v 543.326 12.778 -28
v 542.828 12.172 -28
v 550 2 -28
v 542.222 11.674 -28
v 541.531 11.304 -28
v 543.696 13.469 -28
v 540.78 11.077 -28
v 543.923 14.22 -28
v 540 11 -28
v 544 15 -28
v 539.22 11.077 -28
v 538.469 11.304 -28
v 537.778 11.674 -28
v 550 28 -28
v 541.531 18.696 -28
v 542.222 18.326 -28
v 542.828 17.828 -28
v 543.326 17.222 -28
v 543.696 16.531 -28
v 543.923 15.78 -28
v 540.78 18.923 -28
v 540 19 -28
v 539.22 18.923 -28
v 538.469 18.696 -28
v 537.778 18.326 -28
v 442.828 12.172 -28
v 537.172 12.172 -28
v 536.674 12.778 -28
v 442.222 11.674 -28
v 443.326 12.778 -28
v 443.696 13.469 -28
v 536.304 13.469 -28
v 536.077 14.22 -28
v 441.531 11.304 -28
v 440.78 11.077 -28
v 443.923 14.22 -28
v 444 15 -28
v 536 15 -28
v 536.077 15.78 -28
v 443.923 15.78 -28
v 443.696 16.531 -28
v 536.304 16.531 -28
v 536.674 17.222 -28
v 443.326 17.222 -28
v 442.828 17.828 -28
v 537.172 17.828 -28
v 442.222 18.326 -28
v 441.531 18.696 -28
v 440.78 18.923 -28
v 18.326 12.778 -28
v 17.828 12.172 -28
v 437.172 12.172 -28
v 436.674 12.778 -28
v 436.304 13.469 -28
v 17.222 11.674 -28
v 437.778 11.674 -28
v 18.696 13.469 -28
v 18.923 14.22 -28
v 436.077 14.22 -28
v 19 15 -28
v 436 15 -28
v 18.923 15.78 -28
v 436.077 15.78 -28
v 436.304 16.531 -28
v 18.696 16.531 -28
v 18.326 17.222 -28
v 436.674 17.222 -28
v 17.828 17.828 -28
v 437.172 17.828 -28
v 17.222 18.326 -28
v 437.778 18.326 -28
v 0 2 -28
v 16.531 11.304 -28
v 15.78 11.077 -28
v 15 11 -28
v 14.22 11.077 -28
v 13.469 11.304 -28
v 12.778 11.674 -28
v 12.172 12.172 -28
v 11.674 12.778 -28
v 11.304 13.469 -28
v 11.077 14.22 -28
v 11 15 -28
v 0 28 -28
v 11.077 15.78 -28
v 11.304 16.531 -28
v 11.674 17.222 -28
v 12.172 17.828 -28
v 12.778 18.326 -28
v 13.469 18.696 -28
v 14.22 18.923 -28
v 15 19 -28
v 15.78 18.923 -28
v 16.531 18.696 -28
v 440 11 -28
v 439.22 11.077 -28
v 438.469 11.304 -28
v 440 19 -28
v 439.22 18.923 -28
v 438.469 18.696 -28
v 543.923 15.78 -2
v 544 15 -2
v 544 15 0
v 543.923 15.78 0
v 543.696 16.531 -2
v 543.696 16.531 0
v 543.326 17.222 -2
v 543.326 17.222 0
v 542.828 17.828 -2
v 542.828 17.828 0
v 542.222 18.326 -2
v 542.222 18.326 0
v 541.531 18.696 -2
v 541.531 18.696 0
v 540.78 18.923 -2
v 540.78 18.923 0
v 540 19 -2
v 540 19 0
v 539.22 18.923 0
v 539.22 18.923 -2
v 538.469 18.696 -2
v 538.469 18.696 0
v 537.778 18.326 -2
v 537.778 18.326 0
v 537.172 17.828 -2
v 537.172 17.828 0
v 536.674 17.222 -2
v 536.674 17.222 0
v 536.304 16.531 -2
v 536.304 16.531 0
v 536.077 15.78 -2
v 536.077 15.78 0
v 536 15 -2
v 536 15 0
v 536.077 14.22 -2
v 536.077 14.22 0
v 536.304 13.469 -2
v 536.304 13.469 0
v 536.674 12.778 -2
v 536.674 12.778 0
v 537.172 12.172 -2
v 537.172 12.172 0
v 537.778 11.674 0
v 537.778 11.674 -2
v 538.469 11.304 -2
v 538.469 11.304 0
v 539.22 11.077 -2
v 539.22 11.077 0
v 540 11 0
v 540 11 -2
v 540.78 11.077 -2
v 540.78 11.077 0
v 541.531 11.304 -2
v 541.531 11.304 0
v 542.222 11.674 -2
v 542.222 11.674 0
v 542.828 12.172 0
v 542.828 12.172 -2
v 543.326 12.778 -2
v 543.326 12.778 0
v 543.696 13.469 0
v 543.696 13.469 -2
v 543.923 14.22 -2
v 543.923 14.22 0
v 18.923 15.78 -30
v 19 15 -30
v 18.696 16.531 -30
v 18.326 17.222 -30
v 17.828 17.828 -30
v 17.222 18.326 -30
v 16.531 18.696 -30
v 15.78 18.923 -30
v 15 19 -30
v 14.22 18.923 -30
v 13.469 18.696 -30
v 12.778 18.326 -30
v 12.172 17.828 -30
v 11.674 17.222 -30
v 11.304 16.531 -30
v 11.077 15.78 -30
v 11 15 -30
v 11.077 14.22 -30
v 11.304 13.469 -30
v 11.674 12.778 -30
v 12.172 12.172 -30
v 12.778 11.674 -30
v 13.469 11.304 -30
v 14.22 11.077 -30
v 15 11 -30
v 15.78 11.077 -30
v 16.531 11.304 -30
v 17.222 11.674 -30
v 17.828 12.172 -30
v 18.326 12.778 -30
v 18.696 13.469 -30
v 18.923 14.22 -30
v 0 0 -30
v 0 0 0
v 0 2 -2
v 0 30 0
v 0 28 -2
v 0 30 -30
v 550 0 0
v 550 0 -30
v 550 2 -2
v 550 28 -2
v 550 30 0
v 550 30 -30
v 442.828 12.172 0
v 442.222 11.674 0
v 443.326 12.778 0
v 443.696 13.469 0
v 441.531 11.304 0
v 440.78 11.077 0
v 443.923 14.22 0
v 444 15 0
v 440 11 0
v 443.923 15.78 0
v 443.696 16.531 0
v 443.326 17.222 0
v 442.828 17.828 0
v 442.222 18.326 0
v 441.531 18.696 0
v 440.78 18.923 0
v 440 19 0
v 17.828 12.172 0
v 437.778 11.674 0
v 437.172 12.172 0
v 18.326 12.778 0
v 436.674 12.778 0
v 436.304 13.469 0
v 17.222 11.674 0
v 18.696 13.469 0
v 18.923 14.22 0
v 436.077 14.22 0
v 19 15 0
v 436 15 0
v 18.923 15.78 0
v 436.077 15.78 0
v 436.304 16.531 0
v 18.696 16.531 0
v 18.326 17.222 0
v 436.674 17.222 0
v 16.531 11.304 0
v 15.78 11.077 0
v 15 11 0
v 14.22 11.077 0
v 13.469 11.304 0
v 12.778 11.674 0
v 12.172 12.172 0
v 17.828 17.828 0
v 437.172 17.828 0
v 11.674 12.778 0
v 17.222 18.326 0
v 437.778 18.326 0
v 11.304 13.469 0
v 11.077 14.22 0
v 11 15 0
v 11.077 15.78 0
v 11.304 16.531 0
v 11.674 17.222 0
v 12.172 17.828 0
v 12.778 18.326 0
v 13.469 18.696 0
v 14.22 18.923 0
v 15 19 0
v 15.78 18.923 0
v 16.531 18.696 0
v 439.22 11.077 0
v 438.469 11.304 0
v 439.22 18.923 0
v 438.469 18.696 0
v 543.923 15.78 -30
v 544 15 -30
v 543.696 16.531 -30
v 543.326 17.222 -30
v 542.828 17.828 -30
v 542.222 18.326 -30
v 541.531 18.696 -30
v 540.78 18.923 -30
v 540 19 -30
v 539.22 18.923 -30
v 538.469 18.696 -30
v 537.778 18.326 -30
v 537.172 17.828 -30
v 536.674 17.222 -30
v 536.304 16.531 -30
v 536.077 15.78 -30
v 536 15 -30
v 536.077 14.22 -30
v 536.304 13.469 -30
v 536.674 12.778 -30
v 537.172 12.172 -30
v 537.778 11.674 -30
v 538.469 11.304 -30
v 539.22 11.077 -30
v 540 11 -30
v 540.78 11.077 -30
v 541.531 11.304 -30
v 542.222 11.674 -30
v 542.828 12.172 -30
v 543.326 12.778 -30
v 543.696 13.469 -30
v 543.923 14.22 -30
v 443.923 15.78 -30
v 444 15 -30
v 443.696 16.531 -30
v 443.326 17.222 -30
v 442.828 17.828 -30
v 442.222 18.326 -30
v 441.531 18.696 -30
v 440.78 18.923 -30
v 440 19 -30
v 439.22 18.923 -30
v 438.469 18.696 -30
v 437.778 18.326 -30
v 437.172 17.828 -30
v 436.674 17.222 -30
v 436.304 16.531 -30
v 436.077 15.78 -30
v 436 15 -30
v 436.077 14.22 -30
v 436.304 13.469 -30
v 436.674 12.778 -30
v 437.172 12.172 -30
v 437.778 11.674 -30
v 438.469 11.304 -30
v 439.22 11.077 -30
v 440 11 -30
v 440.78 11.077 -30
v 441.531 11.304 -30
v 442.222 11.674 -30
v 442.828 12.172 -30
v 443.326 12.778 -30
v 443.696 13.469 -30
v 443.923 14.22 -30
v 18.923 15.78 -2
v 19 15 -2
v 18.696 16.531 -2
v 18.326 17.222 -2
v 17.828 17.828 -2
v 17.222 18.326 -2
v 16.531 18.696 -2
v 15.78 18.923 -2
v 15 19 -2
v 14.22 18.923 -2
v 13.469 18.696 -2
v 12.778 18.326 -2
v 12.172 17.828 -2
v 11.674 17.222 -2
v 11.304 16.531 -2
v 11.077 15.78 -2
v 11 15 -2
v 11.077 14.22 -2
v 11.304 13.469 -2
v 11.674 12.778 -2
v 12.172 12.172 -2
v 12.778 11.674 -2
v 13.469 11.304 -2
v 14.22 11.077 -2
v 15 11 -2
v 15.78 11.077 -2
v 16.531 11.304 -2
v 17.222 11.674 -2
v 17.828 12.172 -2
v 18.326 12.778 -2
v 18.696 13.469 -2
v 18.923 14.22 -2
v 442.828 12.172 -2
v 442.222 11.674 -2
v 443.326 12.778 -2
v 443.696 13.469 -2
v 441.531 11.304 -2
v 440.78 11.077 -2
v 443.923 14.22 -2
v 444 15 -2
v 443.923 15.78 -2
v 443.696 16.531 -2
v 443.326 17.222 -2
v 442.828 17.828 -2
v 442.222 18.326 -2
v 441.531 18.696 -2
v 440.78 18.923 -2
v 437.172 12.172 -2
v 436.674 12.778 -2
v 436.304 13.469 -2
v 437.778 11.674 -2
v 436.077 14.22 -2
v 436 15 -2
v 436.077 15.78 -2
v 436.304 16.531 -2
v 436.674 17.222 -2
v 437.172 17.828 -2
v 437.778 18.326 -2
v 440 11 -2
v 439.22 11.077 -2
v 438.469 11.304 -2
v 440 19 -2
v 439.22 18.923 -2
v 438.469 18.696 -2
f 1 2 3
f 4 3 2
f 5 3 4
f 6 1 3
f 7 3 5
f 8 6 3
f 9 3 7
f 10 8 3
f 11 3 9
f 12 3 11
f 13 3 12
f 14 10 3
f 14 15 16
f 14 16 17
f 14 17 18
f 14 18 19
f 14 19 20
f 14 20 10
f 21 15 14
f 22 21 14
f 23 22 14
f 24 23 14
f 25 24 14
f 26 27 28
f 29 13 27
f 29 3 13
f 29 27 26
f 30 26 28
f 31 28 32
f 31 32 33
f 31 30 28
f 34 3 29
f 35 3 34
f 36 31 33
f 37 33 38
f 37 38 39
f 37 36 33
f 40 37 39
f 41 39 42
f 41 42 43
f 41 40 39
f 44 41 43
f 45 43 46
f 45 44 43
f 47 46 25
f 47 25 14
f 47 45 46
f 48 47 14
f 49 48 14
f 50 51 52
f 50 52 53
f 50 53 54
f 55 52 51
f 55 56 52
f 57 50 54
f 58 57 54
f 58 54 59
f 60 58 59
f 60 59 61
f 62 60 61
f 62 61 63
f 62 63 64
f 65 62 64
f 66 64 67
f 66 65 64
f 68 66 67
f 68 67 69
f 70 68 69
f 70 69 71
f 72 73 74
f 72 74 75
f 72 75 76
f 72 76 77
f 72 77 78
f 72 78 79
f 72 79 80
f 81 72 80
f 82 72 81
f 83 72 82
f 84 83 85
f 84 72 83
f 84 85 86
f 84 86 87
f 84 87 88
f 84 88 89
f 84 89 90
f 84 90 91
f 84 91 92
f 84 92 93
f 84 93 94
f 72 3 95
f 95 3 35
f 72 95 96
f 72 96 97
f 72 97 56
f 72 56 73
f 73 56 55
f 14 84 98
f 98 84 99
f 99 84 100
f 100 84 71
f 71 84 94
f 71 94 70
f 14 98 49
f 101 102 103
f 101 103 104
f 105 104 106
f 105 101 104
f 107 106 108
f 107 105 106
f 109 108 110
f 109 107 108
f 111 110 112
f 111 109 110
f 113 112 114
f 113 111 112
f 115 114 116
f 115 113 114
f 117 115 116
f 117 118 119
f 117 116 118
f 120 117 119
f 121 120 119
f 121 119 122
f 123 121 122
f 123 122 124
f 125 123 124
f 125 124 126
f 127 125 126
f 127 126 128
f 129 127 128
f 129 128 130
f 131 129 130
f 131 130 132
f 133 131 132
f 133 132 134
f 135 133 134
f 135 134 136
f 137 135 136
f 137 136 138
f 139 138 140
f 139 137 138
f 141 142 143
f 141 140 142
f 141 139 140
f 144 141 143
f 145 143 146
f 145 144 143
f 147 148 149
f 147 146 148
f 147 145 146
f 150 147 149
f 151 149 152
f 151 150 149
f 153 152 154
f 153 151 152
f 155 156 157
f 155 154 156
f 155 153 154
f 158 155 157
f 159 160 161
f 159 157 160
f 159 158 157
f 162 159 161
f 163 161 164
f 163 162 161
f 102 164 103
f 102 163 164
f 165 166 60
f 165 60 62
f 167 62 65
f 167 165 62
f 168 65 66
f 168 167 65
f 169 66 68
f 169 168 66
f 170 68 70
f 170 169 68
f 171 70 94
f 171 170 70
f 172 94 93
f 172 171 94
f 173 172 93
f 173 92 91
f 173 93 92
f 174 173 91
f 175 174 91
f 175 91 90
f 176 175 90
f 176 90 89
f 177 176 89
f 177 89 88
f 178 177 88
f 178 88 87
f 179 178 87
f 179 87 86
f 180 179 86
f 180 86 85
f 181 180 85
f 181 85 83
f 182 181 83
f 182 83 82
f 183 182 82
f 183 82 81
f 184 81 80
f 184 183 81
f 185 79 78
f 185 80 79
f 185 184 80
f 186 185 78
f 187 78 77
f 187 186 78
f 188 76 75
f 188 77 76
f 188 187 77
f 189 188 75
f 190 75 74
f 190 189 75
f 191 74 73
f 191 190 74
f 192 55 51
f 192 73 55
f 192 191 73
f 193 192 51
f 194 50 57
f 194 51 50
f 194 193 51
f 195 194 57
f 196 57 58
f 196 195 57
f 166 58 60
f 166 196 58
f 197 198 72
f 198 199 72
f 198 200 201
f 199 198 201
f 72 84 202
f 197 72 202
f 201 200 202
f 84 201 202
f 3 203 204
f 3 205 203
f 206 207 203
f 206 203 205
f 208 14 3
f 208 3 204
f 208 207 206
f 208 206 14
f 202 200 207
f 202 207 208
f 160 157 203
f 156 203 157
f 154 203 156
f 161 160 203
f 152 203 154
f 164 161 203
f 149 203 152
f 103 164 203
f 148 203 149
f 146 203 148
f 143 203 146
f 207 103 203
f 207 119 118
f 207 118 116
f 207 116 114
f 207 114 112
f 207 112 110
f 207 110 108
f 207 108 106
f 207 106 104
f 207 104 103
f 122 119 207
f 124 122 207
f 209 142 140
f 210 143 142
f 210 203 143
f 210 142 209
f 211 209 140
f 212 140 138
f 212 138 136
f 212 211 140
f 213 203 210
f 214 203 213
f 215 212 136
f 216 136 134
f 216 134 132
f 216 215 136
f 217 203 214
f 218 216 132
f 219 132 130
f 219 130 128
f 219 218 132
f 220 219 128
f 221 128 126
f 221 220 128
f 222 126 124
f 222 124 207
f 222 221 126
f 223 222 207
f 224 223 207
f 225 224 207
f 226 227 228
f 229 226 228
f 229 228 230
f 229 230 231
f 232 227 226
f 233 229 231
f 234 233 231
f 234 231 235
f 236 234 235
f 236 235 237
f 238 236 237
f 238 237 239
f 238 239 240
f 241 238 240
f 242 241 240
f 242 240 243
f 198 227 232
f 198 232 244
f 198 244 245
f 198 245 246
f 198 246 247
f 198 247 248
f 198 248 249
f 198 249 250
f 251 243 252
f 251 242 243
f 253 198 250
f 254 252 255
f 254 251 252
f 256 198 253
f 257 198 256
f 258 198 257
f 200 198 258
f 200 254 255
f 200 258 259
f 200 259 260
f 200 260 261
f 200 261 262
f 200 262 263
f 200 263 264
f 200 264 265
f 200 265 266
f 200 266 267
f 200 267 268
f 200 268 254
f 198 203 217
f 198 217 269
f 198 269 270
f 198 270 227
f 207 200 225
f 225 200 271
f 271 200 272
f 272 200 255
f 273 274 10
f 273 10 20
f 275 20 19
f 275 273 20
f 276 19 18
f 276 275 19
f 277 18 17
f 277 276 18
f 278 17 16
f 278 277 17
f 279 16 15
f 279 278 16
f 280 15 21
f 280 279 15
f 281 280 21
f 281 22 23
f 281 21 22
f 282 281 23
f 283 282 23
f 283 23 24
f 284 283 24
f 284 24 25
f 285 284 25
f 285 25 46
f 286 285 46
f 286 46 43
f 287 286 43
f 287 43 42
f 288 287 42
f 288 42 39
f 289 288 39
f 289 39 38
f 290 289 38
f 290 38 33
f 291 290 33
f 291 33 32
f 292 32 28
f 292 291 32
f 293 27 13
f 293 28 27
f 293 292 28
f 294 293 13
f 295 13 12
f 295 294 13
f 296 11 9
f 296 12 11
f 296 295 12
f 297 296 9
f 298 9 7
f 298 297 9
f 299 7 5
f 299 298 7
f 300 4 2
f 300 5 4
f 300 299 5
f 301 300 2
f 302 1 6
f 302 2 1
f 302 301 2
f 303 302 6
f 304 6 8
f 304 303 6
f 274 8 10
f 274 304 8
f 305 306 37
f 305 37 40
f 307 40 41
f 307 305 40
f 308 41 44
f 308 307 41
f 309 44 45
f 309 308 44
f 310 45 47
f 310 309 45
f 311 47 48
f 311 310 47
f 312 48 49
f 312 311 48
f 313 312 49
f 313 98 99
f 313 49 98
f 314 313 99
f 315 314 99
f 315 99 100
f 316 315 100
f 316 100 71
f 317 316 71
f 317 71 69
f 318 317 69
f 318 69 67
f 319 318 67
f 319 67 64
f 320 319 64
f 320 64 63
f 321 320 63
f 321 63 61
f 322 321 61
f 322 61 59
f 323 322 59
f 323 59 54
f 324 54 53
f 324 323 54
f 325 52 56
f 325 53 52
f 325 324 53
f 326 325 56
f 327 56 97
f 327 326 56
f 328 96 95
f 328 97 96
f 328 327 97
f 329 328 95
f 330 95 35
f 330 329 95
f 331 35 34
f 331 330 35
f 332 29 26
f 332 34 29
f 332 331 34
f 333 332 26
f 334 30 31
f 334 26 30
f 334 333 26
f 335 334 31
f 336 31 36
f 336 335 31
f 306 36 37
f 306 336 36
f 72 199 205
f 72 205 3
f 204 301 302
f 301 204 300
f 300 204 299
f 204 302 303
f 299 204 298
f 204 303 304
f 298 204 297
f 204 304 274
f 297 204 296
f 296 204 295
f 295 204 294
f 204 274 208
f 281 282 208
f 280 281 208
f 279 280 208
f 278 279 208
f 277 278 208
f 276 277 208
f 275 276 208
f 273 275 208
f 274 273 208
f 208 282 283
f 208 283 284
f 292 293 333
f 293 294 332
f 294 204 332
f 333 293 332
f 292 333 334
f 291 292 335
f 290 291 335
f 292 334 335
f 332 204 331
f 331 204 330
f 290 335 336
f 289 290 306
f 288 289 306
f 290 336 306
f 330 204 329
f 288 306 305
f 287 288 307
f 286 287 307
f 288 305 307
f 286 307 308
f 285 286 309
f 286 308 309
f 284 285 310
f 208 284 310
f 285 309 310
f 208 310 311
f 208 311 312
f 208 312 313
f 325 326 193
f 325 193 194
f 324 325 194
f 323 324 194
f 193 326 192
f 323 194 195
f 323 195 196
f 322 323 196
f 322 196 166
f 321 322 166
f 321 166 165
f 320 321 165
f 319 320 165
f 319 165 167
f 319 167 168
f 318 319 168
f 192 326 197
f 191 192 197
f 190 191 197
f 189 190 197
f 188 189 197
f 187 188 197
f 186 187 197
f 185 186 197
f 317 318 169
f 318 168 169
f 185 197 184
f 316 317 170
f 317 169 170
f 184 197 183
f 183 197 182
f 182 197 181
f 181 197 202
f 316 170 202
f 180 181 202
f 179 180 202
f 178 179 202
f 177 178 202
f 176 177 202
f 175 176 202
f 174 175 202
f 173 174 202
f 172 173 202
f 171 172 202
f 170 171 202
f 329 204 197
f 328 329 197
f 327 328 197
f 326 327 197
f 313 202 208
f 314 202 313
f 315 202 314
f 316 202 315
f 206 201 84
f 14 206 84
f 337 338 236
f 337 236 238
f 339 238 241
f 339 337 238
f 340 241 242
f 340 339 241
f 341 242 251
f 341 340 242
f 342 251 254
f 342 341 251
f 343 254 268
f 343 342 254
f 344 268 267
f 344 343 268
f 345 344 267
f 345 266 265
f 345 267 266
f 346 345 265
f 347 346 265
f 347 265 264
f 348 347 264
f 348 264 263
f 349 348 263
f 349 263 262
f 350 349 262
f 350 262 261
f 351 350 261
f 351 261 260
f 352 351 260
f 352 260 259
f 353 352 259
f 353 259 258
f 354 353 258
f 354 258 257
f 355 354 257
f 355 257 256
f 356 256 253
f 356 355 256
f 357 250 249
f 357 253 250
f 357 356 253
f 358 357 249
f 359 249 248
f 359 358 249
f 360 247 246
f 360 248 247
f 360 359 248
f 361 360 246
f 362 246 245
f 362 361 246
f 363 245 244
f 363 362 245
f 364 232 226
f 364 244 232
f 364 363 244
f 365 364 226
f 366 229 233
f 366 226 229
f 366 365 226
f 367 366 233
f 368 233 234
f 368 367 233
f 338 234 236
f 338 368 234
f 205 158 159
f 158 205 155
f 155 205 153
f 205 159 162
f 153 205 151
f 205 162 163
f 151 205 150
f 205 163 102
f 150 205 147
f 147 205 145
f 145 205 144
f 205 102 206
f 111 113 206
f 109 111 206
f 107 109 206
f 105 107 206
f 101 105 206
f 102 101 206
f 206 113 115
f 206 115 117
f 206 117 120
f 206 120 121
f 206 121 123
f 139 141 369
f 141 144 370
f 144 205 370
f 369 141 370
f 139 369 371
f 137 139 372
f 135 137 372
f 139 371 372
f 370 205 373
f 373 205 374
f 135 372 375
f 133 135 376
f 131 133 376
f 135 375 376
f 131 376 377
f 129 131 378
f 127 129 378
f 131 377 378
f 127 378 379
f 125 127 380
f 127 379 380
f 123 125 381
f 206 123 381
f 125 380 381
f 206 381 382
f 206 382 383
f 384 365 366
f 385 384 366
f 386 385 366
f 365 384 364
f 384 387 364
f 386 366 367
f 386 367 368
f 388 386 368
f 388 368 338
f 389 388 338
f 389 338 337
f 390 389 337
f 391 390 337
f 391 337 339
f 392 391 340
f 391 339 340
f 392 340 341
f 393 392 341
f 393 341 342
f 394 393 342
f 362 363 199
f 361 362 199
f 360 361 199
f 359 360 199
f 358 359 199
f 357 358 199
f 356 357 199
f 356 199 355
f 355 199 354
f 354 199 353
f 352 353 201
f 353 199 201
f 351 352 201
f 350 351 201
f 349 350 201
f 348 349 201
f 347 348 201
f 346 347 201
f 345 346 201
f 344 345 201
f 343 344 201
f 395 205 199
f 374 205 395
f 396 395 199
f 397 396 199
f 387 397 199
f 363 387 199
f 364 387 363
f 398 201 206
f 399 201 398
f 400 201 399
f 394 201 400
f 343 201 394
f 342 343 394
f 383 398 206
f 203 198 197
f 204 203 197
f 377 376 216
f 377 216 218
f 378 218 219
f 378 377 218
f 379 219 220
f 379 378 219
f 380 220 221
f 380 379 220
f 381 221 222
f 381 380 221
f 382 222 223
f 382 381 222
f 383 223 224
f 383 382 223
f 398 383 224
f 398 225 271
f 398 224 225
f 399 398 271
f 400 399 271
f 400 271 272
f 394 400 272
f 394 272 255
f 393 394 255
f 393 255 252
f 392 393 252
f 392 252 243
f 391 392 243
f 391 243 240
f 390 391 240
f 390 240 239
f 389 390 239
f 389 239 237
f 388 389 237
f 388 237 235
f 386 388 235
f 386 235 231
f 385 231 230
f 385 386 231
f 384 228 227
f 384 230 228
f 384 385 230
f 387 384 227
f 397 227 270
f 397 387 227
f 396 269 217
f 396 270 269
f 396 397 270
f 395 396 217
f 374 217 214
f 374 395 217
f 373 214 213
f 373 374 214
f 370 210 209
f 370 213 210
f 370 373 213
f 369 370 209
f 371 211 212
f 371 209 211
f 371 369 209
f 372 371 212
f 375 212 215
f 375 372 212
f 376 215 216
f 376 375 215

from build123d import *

# Parameters (mm, degrees)
SKETCH1_W               = 30
SKETCH1_H               = 30
SKETCH1_W_2             = 26
SKETCH1_H_2             = 26
BOSS_EXTRUDE1_DEPTH     = 550
CUT_EXTRUDE1_DEPTH      = 552.633936592
CUT_EXTRUDE1_DEPTH_BACK = 552.633936592
SKETCH2_R               = 4


with BuildPart() as part:
    # Sketch1 → Boss-Extrude1 (new body)
    with BuildSketch(Plane(origin=(0, 0, 0), x_dir=(0, 0, -1), z_dir=(1, 0, 0))):
        with Locations((15, 15)):
            Rectangle(SKETCH1_W, SKETCH1_H)
        with Locations((15, 15)):
            Rectangle(SKETCH1_W_2, SKETCH1_H_2, mode=Mode.SUBTRACT)
    extrude(amount=BOSS_EXTRUDE1_DEPTH)

    # Sketch2 → Cut-Extrude1 (cut, two sides: drawn at the far end of the back side and taken through both)
    with BuildSketch(Plane.XY.offset(-CUT_EXTRUDE1_DEPTH_BACK)):
        with Locations((15, 15)):
            Circle(SKETCH2_R)
        with Locations((440, 15)):
            Circle(SKETCH2_R)
        with Locations((540, 15)):
            Circle(SKETCH2_R)
    extrude(amount=CUT_EXTRUDE1_DEPTH + CUT_EXTRUDE1_DEPTH_BACK, mode=Mode.SUBTRACT)


solid = part.part
